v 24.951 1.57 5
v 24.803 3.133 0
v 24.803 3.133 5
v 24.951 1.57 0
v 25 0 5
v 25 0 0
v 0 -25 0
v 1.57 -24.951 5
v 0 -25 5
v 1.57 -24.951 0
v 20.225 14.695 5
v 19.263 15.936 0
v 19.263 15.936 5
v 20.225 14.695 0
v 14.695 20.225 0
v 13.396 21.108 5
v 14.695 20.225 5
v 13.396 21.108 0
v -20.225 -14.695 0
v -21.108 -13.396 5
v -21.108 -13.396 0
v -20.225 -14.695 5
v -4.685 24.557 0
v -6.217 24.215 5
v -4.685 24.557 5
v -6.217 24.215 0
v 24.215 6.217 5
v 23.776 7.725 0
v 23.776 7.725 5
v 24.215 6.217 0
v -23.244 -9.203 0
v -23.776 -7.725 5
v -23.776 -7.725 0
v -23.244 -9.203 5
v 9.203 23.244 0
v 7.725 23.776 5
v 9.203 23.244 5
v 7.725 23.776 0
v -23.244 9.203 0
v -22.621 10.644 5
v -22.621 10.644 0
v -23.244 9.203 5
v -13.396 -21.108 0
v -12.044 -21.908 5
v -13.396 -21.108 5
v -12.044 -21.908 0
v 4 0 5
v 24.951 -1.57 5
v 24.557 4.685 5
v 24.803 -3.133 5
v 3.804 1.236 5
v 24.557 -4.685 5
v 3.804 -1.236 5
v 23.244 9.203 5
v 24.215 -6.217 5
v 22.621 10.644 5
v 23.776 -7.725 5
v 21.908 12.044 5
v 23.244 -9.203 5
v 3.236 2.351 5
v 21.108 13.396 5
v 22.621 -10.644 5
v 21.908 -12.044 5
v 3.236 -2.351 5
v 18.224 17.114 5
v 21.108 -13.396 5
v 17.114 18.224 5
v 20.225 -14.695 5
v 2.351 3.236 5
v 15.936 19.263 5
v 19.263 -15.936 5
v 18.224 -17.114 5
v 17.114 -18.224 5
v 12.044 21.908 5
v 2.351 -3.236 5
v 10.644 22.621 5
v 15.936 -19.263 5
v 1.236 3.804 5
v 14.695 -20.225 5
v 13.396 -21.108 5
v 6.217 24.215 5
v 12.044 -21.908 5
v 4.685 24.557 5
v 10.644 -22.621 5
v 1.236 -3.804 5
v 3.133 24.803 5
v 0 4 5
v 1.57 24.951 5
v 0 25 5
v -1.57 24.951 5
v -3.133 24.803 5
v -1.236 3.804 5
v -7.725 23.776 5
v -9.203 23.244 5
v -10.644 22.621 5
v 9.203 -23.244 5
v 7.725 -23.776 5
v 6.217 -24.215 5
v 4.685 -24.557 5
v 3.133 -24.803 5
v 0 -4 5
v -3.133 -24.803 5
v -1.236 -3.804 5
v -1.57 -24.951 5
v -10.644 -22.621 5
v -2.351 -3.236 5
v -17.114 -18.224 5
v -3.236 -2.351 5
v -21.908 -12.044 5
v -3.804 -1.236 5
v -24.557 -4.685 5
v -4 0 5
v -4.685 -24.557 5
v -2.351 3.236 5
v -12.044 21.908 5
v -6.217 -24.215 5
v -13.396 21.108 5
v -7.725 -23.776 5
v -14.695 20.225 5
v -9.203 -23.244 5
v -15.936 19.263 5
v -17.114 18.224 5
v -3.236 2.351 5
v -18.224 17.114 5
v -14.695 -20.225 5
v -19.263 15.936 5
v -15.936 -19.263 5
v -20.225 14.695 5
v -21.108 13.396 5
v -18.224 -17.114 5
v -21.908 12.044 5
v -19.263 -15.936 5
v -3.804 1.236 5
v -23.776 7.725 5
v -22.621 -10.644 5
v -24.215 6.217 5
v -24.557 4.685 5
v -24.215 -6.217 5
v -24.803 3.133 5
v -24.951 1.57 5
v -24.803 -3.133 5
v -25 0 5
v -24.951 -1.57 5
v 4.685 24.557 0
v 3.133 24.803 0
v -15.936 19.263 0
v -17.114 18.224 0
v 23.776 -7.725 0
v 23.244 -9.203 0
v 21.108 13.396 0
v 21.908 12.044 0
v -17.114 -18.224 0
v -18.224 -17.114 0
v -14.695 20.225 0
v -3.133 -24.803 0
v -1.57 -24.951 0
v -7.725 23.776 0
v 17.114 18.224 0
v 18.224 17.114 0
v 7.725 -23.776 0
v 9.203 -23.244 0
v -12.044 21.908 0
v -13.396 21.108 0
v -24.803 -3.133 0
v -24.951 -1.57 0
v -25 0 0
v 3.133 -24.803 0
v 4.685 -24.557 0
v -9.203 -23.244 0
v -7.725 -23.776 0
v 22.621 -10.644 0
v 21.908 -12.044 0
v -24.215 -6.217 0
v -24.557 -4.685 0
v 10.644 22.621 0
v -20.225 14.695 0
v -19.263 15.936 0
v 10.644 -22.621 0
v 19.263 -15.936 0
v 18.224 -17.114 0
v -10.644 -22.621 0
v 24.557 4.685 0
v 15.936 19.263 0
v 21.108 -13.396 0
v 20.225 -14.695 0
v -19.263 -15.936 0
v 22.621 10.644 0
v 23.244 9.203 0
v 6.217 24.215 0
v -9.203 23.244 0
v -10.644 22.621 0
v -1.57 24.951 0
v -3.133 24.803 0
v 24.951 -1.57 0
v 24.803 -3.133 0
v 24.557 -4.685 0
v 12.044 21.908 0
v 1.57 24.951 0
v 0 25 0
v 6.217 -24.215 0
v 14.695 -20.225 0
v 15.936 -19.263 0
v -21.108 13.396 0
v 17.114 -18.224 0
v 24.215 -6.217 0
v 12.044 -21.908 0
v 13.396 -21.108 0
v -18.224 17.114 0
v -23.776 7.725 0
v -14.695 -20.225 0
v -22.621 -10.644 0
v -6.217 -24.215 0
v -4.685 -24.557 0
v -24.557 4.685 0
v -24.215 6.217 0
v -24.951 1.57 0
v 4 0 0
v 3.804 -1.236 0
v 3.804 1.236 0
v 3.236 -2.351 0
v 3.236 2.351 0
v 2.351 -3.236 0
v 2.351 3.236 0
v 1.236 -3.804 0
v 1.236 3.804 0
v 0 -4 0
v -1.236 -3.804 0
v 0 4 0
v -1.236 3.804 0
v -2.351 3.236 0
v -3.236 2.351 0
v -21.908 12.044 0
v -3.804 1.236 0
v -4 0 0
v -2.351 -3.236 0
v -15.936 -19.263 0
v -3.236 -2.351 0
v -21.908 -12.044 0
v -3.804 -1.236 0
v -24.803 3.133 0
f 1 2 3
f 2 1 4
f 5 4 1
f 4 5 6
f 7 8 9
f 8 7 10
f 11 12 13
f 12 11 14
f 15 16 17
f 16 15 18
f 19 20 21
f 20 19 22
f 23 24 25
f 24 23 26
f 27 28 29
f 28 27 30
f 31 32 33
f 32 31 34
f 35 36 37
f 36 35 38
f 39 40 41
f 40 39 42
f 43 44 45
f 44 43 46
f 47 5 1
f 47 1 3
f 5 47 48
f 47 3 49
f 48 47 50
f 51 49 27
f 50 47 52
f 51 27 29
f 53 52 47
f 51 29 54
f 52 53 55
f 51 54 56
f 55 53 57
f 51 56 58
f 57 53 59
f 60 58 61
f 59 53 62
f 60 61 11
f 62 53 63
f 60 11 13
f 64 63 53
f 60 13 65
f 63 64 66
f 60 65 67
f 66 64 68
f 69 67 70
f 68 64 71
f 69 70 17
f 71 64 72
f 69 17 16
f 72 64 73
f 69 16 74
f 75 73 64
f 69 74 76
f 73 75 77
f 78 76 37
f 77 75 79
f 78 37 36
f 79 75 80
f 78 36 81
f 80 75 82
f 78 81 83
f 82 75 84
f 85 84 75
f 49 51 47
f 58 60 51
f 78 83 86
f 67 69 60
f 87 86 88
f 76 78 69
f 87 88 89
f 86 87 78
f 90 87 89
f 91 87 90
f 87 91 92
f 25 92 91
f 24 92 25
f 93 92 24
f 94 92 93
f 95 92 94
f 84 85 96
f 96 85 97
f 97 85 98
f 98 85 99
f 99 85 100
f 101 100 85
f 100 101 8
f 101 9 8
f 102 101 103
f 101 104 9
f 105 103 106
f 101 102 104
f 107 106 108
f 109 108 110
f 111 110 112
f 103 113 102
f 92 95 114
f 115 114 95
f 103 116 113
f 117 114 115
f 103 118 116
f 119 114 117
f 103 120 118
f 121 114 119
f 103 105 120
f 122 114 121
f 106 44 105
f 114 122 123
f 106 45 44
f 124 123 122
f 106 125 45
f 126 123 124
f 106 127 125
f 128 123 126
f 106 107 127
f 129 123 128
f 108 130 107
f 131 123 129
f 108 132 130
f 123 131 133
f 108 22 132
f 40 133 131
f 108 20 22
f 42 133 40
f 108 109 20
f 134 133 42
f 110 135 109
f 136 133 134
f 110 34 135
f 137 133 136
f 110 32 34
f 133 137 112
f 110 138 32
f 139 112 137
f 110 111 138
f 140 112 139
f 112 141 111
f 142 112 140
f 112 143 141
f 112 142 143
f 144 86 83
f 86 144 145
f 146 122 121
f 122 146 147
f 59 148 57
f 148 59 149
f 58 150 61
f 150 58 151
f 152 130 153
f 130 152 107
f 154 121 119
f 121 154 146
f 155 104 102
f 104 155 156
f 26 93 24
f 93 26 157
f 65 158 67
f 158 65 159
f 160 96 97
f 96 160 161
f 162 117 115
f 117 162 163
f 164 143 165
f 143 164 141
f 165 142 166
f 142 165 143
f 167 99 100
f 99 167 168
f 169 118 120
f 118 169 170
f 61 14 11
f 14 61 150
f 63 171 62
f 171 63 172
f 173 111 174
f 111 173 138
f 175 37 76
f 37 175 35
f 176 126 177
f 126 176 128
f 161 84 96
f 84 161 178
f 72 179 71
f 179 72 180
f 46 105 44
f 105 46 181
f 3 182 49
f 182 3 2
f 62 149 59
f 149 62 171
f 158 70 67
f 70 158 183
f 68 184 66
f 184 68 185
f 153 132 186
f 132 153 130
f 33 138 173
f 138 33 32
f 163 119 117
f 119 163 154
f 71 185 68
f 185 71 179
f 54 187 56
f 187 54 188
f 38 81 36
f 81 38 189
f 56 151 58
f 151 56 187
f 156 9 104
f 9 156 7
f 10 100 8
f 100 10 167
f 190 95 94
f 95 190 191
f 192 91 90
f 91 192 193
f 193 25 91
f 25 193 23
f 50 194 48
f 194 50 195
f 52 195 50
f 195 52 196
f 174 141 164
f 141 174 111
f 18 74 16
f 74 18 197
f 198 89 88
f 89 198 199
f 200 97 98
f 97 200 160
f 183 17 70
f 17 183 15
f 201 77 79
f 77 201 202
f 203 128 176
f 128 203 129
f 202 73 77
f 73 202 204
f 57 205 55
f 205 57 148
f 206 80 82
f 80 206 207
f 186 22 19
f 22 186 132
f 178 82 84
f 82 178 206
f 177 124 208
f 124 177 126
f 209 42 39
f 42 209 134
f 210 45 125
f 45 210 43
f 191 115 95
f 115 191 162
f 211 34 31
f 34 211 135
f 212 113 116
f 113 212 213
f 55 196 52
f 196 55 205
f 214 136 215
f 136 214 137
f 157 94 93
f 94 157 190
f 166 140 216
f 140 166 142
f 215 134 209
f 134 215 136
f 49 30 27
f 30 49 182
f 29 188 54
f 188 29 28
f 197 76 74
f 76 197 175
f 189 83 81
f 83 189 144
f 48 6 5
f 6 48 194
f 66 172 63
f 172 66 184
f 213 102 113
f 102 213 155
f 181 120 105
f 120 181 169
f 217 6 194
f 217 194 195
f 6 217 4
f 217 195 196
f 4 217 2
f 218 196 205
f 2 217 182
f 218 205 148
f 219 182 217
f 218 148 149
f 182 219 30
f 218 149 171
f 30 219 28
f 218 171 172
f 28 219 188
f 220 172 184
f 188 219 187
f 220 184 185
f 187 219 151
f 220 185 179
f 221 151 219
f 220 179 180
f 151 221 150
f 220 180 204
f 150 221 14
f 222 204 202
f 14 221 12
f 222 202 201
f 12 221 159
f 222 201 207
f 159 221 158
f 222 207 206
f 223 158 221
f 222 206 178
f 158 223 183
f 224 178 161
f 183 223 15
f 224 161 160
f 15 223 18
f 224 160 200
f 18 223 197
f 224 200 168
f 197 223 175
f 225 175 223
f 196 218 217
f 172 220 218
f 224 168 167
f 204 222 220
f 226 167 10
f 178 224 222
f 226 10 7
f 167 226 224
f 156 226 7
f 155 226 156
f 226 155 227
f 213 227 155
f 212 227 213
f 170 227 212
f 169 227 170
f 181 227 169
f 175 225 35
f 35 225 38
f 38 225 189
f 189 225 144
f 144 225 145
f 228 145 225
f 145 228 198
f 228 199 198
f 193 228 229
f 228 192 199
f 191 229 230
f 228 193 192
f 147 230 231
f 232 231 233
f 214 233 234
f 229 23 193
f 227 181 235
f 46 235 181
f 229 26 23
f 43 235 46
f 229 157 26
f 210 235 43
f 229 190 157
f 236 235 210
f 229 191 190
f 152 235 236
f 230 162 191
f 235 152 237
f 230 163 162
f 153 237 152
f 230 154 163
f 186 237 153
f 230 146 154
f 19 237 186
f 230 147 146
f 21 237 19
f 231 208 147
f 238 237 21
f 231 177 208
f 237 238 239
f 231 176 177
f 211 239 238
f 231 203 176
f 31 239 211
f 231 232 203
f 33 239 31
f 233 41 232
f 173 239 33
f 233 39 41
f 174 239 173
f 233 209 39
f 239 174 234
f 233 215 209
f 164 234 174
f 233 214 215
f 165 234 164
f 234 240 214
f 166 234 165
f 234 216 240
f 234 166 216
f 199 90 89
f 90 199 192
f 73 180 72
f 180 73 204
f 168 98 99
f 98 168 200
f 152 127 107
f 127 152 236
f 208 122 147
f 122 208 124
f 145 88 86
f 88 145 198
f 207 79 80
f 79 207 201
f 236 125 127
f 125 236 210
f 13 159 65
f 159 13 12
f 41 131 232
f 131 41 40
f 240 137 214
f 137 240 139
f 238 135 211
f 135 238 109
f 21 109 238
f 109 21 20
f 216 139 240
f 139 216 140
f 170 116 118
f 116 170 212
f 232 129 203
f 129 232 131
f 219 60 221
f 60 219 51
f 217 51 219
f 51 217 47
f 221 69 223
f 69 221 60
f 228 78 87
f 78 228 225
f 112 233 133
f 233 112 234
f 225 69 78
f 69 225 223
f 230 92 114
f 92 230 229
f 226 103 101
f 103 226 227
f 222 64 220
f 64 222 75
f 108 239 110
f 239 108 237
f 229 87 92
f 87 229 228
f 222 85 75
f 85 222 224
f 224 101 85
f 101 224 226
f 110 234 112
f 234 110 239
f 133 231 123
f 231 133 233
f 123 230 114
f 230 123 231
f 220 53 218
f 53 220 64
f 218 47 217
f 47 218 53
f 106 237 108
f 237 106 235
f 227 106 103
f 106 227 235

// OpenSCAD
grosor=5;
diametro=50;
diam_eje=8;


difference(){
cylinder(r=diametro/2, h=grosor,$fn=100);
cylinder(r=diam_eje/2,h=3*grosor, $fn=20, center=true);
}
